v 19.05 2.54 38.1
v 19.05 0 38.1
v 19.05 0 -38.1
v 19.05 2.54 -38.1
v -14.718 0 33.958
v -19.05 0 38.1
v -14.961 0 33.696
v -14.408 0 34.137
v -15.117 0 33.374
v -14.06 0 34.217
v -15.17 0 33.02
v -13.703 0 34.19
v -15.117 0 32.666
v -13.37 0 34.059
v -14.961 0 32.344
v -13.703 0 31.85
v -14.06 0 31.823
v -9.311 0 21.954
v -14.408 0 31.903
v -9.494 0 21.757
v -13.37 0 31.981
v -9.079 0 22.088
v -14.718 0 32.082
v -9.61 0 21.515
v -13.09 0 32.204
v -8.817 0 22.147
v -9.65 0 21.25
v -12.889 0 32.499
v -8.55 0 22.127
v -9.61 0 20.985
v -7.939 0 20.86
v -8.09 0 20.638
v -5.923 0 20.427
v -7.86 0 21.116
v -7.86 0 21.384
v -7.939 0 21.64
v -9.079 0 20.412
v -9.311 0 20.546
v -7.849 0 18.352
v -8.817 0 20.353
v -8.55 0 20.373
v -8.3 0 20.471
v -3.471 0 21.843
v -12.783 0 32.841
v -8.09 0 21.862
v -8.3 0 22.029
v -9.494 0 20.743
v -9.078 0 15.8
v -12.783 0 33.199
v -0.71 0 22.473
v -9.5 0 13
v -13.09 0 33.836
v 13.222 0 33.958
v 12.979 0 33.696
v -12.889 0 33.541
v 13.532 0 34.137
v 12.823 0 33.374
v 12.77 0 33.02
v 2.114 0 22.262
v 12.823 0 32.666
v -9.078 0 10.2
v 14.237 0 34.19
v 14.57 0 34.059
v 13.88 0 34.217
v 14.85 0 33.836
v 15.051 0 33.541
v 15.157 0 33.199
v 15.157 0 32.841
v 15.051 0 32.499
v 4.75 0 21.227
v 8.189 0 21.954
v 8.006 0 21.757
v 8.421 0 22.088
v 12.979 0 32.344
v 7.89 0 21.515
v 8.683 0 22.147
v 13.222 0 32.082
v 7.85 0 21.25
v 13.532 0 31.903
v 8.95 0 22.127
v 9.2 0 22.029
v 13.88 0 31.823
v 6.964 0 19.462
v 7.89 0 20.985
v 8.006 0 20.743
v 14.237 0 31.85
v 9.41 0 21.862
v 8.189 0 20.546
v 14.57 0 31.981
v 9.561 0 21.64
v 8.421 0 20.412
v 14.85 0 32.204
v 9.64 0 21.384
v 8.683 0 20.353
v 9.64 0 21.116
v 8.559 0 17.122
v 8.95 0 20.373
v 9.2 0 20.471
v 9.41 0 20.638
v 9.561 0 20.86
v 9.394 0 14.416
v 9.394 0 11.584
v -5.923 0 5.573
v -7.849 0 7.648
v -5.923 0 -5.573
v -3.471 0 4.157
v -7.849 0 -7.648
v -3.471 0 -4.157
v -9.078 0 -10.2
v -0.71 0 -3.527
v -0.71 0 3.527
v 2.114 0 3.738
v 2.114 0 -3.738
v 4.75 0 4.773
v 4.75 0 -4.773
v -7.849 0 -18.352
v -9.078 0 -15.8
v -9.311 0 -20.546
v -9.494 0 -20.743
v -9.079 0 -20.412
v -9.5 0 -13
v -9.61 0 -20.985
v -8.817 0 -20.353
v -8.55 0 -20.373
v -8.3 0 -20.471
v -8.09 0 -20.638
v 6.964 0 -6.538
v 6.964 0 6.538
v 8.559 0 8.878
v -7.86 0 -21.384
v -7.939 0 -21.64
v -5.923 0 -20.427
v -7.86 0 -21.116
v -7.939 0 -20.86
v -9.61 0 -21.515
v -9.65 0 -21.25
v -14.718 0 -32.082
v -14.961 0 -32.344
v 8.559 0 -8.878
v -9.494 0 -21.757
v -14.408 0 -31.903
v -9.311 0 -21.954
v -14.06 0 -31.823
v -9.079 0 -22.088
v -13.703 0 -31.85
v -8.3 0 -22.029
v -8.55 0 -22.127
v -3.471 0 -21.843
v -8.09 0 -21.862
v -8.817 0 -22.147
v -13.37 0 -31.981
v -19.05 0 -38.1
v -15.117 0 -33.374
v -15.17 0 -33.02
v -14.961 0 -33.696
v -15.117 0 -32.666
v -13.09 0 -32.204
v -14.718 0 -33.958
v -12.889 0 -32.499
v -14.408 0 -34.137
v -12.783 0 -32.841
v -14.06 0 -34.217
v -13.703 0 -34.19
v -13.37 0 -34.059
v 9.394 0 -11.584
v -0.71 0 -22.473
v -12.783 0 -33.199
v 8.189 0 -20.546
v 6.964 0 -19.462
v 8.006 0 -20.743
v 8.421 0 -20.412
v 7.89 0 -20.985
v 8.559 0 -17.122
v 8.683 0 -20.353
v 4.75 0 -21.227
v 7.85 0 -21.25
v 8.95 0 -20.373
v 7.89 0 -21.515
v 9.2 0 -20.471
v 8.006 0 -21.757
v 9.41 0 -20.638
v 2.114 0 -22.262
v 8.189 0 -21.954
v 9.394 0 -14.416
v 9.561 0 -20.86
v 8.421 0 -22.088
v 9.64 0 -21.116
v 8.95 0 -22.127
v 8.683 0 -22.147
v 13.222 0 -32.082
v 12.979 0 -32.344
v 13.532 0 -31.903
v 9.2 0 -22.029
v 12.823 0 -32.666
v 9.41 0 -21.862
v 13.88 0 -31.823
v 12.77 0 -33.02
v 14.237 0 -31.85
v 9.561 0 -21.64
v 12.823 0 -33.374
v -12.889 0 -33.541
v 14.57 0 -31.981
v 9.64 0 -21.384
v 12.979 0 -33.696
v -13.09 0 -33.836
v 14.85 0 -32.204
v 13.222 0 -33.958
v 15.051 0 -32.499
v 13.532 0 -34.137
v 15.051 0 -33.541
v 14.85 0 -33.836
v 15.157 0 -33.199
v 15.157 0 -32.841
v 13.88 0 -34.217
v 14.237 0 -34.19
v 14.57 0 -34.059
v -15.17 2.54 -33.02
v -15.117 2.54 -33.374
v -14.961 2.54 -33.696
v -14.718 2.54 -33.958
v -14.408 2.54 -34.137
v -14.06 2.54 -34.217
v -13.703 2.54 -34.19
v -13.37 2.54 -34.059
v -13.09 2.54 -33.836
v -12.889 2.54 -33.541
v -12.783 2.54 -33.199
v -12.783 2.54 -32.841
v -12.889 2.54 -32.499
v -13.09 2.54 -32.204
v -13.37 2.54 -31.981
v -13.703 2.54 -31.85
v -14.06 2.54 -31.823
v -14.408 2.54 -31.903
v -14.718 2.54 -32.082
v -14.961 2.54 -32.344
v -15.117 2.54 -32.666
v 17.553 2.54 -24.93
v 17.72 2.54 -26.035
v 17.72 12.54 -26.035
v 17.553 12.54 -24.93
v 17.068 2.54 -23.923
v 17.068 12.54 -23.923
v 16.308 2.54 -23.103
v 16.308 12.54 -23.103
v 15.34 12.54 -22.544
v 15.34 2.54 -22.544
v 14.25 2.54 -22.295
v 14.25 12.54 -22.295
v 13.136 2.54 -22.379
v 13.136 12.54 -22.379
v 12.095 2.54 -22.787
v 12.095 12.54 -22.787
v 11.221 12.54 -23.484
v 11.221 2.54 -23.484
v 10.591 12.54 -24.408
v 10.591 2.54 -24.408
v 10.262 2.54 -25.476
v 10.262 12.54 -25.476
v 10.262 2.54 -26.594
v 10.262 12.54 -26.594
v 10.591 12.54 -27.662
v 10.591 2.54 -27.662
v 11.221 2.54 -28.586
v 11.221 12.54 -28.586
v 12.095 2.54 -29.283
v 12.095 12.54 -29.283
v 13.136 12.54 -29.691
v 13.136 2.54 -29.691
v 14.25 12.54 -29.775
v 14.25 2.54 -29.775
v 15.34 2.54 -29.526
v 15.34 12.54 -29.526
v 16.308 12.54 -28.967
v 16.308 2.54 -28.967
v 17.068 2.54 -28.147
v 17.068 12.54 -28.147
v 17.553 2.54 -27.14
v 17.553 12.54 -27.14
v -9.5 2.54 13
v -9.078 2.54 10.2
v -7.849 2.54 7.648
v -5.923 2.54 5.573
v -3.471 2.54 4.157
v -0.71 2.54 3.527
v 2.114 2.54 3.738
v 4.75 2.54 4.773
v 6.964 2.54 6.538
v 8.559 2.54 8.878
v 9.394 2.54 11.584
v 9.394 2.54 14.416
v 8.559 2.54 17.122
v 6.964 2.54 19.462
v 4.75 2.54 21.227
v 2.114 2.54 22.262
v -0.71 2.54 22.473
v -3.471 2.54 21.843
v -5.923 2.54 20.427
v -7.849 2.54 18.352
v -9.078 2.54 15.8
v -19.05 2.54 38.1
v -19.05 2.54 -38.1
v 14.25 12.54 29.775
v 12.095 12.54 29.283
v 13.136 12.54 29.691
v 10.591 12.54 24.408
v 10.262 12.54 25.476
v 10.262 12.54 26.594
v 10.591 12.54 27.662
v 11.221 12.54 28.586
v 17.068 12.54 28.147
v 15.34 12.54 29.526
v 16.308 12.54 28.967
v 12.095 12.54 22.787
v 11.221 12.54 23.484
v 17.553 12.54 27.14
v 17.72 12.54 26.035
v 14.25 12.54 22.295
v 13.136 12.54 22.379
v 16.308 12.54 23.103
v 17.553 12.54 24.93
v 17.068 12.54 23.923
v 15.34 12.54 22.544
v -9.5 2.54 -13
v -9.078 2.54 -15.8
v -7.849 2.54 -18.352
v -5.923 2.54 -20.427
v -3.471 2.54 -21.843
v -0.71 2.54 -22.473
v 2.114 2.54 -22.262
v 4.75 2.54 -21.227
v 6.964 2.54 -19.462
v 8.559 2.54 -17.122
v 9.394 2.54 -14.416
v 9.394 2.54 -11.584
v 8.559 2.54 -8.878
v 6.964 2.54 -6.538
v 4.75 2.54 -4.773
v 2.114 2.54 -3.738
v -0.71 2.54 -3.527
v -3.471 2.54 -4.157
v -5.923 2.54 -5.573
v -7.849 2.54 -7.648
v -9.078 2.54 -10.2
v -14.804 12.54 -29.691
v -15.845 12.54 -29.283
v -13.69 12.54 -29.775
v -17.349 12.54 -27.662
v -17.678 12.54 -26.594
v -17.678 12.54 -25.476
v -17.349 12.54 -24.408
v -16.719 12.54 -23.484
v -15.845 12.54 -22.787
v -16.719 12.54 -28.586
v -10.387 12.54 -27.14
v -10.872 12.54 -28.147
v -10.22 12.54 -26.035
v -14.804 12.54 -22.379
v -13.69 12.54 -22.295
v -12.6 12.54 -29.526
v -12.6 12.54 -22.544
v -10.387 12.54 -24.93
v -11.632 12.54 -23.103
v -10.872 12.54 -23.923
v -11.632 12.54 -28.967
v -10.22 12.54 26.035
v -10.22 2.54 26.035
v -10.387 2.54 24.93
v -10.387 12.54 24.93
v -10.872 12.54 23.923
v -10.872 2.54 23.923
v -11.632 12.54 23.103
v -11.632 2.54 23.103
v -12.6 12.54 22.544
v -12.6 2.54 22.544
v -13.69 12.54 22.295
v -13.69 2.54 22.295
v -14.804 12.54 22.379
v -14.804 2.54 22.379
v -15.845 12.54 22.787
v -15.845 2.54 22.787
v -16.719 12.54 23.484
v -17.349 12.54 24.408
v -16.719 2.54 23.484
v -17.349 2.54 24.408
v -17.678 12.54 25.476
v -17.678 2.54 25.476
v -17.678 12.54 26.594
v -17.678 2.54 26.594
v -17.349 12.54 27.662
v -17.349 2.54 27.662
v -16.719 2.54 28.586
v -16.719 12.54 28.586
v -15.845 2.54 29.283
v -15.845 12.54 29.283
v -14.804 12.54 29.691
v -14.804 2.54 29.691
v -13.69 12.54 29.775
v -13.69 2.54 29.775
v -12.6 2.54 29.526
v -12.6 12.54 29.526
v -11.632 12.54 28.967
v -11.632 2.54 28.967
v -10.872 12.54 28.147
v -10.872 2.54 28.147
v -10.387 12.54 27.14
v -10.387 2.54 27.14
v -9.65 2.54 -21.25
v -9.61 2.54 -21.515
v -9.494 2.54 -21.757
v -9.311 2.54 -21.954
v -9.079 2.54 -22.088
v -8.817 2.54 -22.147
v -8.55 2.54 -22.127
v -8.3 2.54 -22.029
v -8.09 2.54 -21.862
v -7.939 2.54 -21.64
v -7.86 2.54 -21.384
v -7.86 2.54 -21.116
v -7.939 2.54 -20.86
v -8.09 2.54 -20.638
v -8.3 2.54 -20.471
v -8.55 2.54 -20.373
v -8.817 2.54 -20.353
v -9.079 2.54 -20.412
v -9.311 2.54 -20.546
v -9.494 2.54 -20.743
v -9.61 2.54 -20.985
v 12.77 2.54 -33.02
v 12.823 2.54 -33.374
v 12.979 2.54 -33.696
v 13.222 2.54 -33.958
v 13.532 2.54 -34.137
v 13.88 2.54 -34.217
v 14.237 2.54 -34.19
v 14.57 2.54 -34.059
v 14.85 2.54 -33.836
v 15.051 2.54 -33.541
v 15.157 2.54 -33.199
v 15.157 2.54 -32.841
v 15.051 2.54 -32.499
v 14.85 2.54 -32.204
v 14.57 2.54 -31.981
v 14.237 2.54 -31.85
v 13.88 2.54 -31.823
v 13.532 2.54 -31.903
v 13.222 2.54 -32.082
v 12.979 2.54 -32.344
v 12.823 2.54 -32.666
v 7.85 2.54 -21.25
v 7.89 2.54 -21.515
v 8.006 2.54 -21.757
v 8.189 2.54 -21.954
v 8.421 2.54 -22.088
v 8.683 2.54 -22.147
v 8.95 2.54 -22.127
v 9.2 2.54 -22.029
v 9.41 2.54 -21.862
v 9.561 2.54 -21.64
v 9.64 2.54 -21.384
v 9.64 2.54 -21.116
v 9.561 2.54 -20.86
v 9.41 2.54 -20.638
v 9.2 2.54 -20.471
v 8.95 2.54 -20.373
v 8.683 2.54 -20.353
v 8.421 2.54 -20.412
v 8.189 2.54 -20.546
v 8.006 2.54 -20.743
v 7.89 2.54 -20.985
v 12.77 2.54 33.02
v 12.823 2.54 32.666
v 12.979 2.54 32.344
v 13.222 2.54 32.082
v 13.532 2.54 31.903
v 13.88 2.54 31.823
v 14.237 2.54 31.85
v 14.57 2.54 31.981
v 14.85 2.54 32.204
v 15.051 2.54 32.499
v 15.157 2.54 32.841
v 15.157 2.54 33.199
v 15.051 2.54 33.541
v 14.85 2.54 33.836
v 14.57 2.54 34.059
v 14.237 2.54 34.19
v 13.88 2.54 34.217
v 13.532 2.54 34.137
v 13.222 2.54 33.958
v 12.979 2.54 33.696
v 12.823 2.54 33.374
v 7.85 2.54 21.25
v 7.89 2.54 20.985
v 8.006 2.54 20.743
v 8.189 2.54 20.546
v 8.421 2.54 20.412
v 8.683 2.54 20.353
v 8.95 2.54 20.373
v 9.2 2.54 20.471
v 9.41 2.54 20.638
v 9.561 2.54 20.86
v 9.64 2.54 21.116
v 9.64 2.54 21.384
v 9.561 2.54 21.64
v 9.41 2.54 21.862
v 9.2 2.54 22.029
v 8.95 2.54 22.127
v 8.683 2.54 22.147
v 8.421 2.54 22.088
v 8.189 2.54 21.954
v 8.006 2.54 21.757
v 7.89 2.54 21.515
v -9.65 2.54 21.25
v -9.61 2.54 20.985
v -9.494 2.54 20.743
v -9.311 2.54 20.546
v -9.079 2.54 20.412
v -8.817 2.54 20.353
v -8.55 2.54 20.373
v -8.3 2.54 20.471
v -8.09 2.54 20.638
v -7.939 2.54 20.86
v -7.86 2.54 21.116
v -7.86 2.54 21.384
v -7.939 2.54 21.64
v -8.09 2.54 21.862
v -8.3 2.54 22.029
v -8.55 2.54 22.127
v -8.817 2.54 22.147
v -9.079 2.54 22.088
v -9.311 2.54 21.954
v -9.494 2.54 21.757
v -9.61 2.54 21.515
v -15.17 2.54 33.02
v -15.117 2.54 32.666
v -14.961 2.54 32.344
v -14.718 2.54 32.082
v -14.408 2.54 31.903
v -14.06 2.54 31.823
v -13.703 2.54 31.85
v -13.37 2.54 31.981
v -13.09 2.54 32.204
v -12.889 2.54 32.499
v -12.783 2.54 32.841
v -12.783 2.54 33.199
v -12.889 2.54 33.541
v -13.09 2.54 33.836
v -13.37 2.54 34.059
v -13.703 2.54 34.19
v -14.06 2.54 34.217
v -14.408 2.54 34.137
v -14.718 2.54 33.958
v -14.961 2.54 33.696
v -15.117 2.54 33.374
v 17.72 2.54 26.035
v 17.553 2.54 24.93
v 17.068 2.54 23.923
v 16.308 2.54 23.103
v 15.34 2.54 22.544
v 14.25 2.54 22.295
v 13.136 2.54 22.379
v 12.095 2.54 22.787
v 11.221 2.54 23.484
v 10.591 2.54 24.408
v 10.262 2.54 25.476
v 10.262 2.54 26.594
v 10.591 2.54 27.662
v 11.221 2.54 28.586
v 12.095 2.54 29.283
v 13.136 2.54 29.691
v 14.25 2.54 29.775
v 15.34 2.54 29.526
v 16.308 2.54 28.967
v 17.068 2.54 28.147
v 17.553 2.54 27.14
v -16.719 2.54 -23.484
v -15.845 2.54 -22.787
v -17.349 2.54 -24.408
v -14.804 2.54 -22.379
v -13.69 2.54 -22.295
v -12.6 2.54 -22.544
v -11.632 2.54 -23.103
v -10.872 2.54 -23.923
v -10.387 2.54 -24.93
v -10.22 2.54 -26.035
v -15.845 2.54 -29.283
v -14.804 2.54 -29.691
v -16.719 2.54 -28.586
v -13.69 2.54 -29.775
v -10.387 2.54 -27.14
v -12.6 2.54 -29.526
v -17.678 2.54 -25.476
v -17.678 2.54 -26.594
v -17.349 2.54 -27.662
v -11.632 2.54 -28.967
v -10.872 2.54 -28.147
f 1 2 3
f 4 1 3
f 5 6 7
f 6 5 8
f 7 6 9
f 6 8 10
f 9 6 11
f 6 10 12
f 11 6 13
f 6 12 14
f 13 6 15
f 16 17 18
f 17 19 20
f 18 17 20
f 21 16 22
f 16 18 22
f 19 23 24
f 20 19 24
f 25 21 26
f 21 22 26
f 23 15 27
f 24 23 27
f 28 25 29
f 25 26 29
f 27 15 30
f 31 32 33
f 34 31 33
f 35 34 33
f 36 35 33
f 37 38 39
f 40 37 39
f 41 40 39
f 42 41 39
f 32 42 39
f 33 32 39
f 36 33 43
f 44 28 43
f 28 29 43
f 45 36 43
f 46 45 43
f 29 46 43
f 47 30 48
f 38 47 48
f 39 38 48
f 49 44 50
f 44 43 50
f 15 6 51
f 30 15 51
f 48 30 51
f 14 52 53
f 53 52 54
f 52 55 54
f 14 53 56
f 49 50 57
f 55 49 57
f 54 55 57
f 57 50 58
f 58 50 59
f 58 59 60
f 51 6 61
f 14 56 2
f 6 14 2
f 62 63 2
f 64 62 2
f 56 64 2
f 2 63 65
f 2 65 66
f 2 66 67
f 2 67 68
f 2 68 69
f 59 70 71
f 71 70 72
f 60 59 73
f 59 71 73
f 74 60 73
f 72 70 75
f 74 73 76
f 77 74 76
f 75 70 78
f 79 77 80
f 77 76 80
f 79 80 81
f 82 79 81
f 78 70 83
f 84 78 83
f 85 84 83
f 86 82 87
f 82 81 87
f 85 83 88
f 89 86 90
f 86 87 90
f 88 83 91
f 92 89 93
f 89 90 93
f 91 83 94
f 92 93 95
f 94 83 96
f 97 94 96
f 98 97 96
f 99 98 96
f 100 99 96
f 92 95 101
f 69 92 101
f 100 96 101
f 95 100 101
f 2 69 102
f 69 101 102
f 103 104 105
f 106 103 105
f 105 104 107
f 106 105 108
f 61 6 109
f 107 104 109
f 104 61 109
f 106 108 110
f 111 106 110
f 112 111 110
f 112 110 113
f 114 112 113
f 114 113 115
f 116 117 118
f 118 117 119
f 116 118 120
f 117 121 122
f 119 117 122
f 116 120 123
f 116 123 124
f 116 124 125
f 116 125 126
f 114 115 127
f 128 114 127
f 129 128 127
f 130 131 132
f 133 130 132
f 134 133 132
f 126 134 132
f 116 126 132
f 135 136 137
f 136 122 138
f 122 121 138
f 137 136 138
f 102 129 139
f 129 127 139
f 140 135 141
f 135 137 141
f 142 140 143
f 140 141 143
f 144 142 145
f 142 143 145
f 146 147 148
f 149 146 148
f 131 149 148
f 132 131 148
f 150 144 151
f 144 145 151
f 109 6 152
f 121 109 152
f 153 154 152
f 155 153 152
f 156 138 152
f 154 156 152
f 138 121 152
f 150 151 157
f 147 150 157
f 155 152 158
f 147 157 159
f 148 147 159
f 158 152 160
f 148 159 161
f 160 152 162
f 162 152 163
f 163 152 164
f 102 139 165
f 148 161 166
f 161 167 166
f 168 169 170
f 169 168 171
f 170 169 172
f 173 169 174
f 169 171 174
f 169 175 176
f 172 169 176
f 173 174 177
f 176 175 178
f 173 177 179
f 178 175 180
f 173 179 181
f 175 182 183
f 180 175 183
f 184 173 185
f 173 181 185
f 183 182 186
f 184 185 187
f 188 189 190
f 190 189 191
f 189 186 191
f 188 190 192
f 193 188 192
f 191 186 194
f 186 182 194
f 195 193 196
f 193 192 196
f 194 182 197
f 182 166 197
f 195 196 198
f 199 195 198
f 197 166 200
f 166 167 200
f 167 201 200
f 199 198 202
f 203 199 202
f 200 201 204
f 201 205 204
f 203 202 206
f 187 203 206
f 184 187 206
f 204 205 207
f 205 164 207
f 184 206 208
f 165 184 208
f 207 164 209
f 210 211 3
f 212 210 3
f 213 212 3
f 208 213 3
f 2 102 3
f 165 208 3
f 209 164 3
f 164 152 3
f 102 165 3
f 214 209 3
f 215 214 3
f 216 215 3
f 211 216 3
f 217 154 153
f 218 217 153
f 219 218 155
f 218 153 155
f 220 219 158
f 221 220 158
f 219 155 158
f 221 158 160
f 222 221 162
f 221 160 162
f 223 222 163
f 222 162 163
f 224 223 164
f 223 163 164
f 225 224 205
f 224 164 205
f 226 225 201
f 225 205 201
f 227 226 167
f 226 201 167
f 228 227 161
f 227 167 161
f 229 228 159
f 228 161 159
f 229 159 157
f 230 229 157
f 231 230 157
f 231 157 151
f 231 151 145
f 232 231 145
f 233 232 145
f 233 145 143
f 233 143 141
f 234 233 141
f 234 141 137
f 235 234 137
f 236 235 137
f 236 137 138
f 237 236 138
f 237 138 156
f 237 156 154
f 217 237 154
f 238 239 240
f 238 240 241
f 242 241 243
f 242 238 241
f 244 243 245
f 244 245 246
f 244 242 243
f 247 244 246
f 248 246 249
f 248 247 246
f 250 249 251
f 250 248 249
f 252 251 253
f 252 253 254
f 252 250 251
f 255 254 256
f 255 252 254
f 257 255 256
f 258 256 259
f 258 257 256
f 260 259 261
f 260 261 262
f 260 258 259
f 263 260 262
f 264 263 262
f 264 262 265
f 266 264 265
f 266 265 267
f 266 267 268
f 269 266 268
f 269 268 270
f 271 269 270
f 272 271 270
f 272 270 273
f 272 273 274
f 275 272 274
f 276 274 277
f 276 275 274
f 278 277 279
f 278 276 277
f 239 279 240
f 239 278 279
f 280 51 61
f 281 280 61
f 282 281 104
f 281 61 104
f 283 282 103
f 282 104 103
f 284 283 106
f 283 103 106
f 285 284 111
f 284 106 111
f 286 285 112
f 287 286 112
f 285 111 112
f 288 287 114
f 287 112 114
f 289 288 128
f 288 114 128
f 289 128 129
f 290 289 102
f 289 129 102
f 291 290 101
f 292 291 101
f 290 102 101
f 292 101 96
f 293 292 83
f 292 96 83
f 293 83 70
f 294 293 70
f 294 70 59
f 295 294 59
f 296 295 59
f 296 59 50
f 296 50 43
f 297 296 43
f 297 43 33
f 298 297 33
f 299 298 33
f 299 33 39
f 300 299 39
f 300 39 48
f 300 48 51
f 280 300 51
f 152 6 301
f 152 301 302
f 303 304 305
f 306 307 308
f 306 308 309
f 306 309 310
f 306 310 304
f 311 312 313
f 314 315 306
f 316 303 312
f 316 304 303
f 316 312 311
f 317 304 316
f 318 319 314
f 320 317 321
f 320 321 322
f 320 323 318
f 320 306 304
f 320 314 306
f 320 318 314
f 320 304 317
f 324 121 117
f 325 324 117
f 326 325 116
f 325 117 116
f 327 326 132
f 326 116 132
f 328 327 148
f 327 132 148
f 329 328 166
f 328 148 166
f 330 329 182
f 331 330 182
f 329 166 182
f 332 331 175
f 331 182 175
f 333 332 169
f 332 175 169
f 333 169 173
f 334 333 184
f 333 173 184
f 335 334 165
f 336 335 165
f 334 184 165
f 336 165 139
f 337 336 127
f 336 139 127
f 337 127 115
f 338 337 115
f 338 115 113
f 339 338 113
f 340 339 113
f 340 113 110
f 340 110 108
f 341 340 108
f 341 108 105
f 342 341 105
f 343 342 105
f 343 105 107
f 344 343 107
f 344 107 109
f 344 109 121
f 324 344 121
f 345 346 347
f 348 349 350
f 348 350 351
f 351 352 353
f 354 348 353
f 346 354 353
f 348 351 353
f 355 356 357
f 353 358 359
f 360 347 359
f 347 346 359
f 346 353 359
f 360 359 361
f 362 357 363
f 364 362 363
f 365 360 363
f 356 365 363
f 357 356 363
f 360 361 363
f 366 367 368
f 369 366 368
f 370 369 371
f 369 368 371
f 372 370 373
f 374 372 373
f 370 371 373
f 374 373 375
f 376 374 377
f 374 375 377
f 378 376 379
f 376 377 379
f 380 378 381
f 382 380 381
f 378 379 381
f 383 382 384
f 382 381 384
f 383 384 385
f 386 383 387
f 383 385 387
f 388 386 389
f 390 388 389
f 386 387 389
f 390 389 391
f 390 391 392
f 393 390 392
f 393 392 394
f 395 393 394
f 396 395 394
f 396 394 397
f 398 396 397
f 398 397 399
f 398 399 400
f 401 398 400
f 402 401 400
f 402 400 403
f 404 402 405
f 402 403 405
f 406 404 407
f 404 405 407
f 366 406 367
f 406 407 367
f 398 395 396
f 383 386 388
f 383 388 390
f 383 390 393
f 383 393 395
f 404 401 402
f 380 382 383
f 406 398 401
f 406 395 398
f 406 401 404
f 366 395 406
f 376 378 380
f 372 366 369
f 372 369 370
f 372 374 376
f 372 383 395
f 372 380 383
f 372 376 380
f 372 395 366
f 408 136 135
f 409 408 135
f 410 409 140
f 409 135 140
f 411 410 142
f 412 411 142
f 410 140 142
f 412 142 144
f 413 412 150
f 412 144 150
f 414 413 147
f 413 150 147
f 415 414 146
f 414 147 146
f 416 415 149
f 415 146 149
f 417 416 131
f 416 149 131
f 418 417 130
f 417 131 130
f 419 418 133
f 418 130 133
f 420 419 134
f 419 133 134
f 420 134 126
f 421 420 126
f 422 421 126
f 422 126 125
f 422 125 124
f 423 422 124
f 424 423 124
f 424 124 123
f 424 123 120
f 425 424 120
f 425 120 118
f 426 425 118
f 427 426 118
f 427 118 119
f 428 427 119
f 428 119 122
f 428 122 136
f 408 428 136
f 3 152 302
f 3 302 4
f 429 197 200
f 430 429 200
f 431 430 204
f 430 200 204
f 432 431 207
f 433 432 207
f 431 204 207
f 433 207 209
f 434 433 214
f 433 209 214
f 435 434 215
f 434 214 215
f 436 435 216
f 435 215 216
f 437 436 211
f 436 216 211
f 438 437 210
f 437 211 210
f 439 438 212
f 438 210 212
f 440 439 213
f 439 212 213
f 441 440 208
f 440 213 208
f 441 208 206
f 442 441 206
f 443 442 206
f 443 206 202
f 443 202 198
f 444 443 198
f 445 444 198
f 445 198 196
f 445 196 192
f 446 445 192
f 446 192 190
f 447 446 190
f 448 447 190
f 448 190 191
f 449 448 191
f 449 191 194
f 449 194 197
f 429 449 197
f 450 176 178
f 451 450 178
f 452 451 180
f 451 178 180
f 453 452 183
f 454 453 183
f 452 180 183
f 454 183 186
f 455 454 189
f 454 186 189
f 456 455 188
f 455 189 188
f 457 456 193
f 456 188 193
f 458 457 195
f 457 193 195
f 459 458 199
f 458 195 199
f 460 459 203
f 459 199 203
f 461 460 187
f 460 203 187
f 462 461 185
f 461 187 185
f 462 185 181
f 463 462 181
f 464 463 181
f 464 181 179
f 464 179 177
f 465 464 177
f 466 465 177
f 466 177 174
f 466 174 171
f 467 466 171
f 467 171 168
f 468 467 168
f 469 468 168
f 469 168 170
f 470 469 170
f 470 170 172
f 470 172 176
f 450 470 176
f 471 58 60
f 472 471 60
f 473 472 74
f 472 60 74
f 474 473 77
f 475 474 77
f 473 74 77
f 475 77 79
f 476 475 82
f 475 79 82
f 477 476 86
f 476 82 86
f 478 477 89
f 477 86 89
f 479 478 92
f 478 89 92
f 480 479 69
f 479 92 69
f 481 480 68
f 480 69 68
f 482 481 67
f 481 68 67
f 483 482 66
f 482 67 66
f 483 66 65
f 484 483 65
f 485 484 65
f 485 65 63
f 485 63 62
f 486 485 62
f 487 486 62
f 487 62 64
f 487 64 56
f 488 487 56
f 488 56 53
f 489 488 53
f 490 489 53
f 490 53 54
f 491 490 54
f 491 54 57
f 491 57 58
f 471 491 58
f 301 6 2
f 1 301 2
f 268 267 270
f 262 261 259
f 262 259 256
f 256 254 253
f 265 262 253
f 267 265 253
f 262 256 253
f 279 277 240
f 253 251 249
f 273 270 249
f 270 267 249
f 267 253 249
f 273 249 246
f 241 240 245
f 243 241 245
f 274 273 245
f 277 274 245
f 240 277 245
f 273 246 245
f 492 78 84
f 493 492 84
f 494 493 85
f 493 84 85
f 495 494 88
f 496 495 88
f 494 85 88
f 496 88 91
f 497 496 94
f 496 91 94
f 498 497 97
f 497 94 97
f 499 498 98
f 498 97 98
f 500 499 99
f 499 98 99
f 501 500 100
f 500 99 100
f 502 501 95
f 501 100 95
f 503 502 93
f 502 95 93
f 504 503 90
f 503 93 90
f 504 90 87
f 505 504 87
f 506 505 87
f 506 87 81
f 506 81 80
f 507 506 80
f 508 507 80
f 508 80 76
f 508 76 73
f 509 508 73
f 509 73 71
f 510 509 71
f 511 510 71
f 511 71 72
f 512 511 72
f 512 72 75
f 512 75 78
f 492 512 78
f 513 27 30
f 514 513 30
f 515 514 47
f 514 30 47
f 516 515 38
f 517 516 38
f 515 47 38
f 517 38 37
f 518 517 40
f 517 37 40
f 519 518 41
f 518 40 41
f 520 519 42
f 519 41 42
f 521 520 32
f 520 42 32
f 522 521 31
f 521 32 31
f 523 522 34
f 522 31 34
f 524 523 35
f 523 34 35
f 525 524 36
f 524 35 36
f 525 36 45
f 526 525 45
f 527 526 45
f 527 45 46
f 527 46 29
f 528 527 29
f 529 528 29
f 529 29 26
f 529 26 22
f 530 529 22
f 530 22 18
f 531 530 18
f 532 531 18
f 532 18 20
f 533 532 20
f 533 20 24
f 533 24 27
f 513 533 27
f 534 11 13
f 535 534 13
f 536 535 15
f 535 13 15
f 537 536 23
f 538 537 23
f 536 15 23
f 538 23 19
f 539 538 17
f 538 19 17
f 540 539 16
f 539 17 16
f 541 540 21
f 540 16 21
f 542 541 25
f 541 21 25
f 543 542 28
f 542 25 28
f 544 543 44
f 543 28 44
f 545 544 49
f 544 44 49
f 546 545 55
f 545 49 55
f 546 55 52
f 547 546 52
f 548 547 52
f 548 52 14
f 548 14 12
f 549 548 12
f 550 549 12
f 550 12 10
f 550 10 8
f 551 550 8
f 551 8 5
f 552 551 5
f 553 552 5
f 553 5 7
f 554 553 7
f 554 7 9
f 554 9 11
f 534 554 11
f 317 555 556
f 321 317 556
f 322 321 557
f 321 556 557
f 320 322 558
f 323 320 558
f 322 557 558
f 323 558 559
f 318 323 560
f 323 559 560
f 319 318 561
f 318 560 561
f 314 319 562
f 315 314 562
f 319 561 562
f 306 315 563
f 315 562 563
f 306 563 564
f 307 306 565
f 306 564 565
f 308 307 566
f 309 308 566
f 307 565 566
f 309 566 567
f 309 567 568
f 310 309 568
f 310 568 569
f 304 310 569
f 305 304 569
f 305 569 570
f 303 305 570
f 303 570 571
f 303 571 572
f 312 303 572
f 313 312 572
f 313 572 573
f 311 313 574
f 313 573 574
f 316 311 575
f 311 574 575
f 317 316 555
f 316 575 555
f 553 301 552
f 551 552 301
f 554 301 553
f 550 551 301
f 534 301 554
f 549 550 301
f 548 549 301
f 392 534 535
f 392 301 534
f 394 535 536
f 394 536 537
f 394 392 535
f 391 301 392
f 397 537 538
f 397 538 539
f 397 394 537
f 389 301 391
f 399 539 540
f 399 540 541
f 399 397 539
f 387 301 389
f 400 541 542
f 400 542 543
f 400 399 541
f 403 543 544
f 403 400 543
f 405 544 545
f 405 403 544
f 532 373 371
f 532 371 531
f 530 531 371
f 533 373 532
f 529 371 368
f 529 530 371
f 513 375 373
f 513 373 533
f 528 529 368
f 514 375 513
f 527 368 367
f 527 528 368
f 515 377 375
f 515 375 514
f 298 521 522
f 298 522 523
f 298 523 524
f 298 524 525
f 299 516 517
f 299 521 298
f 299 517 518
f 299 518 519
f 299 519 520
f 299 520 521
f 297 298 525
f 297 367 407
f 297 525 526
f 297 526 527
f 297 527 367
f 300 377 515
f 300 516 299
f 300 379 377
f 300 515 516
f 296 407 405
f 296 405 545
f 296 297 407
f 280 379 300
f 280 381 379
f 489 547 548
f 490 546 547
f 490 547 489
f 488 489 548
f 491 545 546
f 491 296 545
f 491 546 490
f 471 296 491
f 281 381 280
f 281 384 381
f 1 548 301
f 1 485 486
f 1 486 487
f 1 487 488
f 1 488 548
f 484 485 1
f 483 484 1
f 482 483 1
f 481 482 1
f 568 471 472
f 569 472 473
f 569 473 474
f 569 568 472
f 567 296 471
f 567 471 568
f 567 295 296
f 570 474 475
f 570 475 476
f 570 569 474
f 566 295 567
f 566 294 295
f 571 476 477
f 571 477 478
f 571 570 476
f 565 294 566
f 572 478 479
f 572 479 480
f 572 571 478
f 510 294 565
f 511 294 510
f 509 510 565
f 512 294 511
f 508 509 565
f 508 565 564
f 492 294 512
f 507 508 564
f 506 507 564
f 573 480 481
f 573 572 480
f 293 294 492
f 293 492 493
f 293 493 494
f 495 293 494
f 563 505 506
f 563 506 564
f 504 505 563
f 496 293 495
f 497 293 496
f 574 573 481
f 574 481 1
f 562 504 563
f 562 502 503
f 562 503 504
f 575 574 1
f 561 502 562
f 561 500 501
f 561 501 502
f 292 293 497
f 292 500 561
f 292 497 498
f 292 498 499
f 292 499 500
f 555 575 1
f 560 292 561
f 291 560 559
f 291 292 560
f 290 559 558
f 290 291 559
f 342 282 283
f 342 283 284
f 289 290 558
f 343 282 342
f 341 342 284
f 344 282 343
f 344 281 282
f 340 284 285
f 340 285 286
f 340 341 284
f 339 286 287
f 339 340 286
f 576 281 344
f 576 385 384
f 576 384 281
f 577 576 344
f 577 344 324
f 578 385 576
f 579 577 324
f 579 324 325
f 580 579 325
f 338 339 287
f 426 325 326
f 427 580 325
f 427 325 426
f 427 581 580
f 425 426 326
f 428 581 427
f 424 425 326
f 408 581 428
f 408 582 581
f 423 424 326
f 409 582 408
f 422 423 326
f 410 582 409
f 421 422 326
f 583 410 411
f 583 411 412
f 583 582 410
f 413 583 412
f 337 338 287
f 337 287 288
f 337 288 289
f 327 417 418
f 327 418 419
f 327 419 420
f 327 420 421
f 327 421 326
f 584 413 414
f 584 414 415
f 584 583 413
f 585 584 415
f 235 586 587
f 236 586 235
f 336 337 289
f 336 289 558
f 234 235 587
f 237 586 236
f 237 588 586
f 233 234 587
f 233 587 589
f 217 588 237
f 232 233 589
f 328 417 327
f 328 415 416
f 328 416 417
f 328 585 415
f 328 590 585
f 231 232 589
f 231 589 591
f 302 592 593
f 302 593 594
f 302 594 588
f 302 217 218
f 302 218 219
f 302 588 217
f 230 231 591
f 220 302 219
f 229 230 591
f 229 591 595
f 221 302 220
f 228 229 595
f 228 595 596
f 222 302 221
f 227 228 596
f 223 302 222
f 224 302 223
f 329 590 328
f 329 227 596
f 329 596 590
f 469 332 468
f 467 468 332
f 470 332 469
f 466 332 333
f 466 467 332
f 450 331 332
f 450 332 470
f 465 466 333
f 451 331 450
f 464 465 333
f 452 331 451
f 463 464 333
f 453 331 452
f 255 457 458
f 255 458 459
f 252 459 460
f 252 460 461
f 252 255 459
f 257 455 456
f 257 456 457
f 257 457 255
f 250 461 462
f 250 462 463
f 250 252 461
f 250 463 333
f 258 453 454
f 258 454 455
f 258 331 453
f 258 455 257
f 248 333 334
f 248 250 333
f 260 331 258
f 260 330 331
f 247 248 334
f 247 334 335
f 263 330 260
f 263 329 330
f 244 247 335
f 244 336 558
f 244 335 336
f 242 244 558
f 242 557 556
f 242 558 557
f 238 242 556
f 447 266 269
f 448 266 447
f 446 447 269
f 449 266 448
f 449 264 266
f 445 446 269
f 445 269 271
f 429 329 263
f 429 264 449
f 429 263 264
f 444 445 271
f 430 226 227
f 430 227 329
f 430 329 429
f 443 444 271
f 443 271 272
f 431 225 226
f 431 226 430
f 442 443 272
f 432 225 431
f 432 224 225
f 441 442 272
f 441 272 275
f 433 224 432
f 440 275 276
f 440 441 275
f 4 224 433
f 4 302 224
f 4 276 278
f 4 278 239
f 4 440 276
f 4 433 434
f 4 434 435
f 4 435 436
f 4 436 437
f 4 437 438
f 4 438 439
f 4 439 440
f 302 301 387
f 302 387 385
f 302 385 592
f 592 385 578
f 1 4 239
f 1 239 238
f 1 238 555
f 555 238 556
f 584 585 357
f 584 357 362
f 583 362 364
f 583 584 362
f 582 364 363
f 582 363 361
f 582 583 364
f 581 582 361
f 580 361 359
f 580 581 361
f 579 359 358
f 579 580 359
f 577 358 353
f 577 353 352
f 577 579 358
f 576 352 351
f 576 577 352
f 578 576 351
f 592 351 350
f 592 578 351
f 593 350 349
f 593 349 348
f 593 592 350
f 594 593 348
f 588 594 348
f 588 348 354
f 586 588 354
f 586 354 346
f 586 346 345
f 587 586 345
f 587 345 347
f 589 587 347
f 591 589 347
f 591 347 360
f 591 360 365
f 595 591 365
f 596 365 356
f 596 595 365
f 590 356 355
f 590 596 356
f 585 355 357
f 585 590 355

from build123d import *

# Parameters (mm, degrees)
SKETCH1_W              = 38.1
SKETCH1_H              = 76.2
BOSS_EXTRUDE1_DEPTH    = 2.54
F_1_0MM_DOWEL_HOLE1_D  = 19
M1_6_CLEARANCE_HOLE1_D = 1.8
M2_CLEARANCE_HOLE4_D   = 2.4
SKETCH15_R             = 3.749999993
BOSS_EXTRUDE2_DEPTH    = 10.000000066


with BuildPart() as part:
    # Sketch1 → Boss-Extrude1 (new body)
    with BuildSketch(Plane(origin=(0, 0, 0), x_dir=(1, 0, 0), z_dir=(0, 1, 0))):
        Rectangle(SKETCH1_W, SKETCH1_H)
    extrude(amount=BOSS_EXTRUDE1_DEPTH)

    # Ø1.0mm Dowel Hole1 (through all)
    with Locations(Plane(origin=(0, 2.54, 0), x_dir=(1, 0, 0), z_dir=(0, 1, 0))):
        with Locations((0, -13.000000035), (0, 13.000000035)):
            Hole(F_1_0MM_DOWEL_HOLE1_D / 2)

    # M1.6 Clearance Hole1 (through all)
    with Locations(Plane(origin=(0, 2.54, 0), x_dir=(1, 0, 0), z_dir=(0, 1, 0))):
        with Locations((8.750000026, 21.250000045), (8.750000026, -21.250000045), (-8.750000026, -21.250000045), (-8.750000026, 21.250000045)):
            Hole(M1_6_CLEARANCE_HOLE1_D / 2)

    # M2 Clearance Hole4 (through all)
    with Locations(Plane(origin=(0, 2.54, 0), x_dir=(1, 0, 0), z_dir=(0, 1, 0))):
        with Locations((-13.97, 33.02), (13.97, 33.02), (-13.97, -33.02), (13.97, -33.02)):
            Hole(M2_CLEARANCE_HOLE4_D / 2)

    # Sketch15 → Boss-Extrude2 (add)
    with BuildSketch(Plane(origin=(0, 2.54, 0), x_dir=(1, 0, 0), z_dir=(0, 1, 0))):
        with Locations((-13.97, -26.035)):
            Circle(SKETCH15_R)
        with Locations((13.97, -26.035)):
            Circle(SKETCH15_R)
    boss_extrude2 = extrude(amount=BOSS_EXTRUDE2_DEPTH)

    # Mirror1: Boss-Extrude2 across plane
    add(boss_extrude2.mirror(Plane.XY))


solid = part.part
